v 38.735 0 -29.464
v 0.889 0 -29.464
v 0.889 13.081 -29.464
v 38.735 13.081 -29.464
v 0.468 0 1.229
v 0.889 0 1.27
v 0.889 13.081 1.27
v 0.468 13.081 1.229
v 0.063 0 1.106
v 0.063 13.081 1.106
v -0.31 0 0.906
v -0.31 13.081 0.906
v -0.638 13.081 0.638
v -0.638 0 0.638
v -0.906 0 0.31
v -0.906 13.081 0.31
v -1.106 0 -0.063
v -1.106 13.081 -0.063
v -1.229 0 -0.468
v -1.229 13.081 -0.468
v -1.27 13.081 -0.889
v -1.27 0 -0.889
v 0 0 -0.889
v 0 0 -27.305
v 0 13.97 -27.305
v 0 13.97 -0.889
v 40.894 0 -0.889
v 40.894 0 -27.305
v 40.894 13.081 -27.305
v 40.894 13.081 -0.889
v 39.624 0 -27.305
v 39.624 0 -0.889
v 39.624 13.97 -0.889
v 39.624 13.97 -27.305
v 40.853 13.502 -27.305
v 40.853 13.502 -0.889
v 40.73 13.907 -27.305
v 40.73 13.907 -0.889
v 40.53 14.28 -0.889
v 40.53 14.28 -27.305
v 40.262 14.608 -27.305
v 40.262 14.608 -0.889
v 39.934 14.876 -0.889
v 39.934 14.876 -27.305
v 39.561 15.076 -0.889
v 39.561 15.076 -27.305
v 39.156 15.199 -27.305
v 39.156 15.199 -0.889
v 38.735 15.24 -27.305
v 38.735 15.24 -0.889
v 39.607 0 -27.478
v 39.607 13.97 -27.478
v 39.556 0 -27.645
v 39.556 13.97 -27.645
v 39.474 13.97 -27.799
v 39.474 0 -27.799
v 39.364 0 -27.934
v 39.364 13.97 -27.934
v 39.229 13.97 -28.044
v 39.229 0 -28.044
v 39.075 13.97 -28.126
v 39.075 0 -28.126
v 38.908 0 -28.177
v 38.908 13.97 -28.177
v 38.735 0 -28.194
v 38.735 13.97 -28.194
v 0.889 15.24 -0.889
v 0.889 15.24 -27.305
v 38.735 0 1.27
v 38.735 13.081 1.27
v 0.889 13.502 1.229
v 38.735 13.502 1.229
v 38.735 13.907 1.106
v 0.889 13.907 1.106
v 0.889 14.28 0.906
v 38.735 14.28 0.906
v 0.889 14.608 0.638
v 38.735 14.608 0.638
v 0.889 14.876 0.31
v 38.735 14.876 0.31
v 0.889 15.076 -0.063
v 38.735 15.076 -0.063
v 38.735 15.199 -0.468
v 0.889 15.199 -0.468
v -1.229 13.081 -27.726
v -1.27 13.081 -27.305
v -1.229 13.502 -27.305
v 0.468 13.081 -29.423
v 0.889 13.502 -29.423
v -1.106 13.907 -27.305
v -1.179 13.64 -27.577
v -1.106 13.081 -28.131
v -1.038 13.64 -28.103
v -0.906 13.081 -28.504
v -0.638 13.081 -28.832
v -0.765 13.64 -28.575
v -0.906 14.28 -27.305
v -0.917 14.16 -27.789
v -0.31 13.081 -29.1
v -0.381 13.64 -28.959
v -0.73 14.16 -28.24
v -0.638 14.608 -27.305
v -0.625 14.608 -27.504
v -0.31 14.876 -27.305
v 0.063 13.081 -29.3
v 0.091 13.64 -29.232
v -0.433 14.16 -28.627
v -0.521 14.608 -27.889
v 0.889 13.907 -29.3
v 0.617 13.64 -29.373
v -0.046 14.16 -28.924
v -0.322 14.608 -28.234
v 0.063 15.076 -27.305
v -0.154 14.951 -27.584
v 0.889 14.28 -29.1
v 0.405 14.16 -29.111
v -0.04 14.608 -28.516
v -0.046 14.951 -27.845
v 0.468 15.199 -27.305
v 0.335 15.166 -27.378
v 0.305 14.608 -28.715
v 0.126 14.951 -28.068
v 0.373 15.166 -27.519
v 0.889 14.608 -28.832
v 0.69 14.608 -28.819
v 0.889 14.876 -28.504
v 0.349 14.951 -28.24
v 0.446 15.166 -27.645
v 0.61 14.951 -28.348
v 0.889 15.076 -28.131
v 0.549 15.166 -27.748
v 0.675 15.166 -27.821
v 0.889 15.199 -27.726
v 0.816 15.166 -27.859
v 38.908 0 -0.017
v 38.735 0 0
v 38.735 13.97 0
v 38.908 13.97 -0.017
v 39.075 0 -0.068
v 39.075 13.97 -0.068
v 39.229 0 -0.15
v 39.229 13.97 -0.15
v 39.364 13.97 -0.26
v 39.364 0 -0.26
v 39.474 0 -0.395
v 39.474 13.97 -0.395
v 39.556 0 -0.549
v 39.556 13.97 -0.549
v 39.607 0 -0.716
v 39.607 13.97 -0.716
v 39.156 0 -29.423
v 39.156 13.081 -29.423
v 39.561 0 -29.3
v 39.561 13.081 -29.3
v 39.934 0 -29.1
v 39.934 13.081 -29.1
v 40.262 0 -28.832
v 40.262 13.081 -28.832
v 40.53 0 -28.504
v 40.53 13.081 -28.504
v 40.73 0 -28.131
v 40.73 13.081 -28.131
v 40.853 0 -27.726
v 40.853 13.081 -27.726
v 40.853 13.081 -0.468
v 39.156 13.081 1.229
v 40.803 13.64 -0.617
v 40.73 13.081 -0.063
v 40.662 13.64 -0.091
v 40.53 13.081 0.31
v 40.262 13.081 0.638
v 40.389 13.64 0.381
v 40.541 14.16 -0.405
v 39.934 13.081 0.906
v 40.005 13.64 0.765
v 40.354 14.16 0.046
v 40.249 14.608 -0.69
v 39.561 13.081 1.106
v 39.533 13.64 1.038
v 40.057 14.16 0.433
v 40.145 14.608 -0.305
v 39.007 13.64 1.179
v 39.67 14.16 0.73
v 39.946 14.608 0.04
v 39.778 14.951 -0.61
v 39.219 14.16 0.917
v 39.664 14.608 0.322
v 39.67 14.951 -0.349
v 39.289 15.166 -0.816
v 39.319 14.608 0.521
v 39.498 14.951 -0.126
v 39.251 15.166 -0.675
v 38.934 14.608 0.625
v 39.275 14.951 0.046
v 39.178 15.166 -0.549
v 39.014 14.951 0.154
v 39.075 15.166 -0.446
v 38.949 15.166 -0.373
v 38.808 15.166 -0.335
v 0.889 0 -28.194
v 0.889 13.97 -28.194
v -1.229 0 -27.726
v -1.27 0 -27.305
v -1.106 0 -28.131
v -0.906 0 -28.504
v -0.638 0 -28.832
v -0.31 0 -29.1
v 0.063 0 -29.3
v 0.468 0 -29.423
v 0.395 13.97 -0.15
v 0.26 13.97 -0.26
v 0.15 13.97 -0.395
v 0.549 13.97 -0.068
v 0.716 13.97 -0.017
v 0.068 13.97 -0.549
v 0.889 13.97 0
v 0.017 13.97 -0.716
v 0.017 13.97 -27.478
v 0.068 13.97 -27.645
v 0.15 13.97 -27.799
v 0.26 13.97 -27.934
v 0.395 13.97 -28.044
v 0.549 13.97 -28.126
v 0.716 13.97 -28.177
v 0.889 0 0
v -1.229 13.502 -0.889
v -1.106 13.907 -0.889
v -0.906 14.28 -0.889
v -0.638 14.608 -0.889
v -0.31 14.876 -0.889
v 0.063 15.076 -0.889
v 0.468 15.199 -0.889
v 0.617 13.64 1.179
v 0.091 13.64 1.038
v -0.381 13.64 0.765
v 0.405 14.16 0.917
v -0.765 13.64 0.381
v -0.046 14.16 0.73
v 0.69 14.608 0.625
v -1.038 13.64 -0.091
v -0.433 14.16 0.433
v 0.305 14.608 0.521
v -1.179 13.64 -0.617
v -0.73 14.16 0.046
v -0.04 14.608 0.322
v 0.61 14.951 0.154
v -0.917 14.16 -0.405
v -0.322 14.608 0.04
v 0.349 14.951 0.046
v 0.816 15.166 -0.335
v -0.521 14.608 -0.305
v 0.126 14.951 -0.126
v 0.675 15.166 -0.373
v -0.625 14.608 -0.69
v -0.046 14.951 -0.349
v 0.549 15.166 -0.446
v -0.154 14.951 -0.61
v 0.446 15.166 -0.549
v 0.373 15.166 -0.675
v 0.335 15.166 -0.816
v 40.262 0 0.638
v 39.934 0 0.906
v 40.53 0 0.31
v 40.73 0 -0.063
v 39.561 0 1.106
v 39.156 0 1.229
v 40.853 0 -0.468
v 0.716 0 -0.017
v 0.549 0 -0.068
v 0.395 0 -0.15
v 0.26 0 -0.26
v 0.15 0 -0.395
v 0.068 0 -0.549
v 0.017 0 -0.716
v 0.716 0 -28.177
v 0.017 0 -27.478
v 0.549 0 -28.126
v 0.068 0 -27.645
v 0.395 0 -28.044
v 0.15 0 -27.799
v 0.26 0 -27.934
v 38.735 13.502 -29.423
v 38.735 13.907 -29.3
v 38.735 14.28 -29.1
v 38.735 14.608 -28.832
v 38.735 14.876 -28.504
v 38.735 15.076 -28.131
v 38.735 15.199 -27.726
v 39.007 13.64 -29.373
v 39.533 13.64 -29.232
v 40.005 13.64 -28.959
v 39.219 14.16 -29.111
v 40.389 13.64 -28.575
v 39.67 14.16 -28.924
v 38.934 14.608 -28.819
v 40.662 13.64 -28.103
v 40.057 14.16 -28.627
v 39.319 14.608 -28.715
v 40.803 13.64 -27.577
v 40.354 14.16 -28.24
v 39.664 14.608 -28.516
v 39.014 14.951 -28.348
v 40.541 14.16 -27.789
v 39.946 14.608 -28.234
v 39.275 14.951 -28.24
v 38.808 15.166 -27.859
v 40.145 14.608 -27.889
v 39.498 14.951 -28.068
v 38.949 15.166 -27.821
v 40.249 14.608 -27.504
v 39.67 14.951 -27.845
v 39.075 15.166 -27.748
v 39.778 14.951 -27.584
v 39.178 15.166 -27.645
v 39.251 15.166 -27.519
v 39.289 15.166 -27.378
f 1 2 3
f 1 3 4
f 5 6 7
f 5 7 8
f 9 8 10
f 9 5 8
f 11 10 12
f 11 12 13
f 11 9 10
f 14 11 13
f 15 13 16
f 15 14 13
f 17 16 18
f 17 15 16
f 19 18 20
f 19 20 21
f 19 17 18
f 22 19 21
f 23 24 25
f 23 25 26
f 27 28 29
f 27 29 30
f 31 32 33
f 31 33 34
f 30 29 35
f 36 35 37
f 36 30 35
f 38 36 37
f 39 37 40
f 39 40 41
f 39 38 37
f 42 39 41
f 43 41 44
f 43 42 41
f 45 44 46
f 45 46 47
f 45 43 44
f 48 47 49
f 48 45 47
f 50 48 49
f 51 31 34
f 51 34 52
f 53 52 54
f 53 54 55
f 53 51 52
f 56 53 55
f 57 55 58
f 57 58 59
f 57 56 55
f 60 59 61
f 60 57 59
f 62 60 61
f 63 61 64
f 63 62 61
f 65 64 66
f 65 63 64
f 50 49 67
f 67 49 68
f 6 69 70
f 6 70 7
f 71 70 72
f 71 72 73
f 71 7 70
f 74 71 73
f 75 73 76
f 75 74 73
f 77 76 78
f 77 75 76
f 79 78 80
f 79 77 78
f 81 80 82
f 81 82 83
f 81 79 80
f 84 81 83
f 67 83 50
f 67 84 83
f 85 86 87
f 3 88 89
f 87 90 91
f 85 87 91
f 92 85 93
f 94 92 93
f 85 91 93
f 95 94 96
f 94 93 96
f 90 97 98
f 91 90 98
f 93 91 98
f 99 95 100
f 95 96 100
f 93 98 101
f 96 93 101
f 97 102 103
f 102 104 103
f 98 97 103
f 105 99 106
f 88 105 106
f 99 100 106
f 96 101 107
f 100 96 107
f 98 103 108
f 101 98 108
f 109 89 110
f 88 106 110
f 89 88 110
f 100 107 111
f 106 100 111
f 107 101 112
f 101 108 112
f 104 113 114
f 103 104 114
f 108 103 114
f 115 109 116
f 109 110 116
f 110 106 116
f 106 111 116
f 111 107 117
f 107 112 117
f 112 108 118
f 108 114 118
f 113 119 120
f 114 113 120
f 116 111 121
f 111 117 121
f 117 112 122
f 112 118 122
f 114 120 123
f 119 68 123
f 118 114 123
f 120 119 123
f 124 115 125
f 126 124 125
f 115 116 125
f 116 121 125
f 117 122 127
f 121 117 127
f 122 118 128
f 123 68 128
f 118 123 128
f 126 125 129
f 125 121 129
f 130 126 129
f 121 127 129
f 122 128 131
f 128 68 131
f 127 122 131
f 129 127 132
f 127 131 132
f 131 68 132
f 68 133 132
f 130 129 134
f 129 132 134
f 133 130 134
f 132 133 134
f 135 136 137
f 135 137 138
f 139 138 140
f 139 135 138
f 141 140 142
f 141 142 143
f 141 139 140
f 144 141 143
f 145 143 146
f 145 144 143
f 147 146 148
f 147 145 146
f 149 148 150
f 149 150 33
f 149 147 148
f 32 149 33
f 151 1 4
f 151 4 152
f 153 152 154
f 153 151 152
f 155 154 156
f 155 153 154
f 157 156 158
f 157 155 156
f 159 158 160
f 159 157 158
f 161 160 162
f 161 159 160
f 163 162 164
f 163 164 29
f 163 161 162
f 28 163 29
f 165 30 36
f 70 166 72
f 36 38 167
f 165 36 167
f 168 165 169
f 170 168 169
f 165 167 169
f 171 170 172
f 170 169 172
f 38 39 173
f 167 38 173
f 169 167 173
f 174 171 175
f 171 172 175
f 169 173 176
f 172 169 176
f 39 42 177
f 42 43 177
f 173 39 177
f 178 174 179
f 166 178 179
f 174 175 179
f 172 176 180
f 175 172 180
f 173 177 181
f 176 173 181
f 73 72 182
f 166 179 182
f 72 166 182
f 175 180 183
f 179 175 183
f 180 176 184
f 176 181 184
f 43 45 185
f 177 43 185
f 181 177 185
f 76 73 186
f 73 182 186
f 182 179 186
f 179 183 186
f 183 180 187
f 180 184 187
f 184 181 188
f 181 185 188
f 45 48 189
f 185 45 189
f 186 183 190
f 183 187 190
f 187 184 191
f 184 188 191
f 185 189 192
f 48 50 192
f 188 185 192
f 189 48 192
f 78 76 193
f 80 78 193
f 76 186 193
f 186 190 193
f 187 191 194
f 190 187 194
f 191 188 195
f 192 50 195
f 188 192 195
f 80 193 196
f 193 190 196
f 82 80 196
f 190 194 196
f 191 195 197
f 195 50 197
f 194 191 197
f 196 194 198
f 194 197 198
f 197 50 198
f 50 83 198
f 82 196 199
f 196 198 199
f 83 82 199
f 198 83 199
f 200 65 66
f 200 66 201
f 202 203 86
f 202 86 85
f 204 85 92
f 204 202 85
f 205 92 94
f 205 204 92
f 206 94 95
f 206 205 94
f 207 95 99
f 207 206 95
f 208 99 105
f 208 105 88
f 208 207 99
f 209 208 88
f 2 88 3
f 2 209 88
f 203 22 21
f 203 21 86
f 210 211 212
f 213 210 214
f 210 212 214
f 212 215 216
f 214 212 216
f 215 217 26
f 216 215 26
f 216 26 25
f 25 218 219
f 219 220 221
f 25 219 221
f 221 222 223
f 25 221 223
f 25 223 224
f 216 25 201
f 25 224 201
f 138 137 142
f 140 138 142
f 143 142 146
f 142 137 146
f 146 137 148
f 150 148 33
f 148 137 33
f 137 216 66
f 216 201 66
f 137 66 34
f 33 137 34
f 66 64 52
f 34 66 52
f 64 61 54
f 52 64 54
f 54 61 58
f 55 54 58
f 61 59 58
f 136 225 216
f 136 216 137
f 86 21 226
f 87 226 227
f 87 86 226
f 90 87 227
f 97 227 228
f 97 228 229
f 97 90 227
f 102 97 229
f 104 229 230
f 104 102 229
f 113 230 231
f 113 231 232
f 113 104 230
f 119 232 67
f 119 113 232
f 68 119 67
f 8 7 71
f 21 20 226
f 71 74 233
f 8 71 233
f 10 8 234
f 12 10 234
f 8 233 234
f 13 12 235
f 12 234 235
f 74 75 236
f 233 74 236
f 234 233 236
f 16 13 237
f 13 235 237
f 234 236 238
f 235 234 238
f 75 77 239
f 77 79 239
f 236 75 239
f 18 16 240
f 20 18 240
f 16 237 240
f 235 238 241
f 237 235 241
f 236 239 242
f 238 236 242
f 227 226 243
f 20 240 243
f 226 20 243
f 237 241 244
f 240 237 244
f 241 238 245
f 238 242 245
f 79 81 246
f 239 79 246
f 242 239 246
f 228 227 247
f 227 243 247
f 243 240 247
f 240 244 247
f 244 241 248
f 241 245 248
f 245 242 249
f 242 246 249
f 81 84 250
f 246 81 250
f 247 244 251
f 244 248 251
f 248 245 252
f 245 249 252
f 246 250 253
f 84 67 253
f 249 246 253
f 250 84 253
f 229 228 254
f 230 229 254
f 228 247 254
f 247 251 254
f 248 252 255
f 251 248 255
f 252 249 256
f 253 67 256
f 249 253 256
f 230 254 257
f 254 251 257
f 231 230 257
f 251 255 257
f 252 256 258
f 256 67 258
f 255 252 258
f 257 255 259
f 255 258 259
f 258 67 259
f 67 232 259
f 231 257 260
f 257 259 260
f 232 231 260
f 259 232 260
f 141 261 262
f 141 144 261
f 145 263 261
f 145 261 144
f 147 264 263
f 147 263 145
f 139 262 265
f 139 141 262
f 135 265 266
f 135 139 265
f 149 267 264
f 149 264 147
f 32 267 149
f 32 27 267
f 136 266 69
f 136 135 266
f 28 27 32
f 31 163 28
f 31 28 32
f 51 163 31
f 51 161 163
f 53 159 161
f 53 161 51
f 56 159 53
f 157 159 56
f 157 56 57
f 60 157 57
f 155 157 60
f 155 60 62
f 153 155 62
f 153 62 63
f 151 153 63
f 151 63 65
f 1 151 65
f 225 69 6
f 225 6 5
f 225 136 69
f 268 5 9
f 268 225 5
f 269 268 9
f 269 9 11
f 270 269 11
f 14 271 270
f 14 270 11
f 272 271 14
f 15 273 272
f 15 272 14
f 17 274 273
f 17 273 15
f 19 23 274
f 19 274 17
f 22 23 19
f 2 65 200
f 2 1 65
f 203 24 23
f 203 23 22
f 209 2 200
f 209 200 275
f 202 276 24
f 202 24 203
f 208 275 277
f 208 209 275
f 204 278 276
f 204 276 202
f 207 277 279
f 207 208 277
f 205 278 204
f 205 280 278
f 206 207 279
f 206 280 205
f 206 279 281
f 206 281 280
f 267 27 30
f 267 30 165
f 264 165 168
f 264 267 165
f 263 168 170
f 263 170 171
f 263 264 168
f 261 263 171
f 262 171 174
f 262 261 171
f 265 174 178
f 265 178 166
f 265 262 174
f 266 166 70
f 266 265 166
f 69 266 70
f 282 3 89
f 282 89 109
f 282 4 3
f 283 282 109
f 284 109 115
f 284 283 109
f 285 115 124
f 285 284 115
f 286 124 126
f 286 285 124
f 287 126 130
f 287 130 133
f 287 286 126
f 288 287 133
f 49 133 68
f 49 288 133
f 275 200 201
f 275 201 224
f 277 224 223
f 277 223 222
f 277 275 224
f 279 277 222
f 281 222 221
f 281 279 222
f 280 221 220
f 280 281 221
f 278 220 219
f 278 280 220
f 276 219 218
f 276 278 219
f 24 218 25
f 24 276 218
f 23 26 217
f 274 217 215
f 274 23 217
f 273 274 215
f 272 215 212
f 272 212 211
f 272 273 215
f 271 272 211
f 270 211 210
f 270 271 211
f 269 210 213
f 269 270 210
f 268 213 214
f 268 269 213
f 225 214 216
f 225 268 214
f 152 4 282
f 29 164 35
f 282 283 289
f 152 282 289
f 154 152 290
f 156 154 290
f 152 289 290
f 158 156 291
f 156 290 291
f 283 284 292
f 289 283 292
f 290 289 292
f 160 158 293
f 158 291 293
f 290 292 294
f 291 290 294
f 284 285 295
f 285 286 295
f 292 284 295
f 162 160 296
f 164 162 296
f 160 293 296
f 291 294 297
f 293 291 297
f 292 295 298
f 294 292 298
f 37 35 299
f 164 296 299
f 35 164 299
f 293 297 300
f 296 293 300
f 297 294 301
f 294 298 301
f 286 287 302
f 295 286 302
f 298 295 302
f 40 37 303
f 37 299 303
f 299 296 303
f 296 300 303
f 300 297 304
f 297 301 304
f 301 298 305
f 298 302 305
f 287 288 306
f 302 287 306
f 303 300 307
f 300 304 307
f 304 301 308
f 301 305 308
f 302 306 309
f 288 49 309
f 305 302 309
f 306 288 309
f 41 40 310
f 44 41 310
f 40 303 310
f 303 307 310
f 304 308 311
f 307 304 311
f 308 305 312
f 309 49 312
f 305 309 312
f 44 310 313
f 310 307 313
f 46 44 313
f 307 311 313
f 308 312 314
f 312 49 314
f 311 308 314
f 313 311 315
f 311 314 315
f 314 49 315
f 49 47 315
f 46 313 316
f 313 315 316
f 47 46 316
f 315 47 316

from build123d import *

# Parameters (mm, degrees)
BOSS_EXTRUDE1_DEPTH = 15.24
BOSS_EXTRUDE2_START = -1.27
BOSS_EXTRUDE2_DEPTH = 1.27
FILLET1_R           = 2.159


with BuildPart() as part:
    # Sketch1 → Boss-Extrude1 (new body)
    with BuildSketch(Plane(origin=(0, 0, 0), x_dir=(1, 0, 0), z_dir=(0, 1, 0))):
        with BuildLine():
            ThreePointArc((0.889, 29.464), (-0.637643541, 28.831643541), (-1.27, 27.305))
            Line((-1.27, 27.305), (-1.27, 0.889))
            ThreePointArc((-1.27, 0.889), (-0.637643541, -0.637643541), (0.889, -1.27))
            Line((0.889, -1.27), (38.735, -1.27))
            ThreePointArc((38.735, -1.27), (40.261643541, -0.637643541), (40.894, 0.889))
            Line((40.894, 0.889), (40.894, 27.305))
            ThreePointArc((40.894, 27.305), (40.261643541, 28.831643541), (38.735, 29.464))
            Line((38.735, 29.464), (0.889, 29.464))
        make_face()
        with BuildLine():
            Line((38.735, 0), (0.889, 0))
            ThreePointArc((0.889, 0), (0.260382072, 0.260382072), (0, 0.889))
            Line((0, 0.889), (0, 27.305))
            ThreePointArc((0, 27.305), (0.260382072, 27.933617928), (0.889, 28.194))
            Line((0.889, 28.194), (38.735, 28.194))
            ThreePointArc((38.735, 28.194), (39.363617928, 27.933617928), (39.624, 27.305))
            Line((39.624, 27.305), (39.624, 0.889))
            ThreePointArc((39.624, 0.889), (39.363617928, 0.260382072), (38.735, 0))
        make_face(mode=Mode.SUBTRACT)
    extrude(amount=BOSS_EXTRUDE1_DEPTH)

    # Sketch2 → Boss-Extrude2 (add)
    with BuildSketch(Plane(origin=(0, 15.24, 0), x_dir=(1, 0, 0), z_dir=(0, 1, 0)).offset(BOSS_EXTRUDE2_START)):
        with BuildLine():
            Line((38.735, 28.194), (0.889, 28.194))
            ThreePointArc((0.889, 28.194), (0.260382072, 27.933617928), (0, 27.305))
            Line((0, 27.305), (0, 0.889))
            ThreePointArc((0, 0.889), (0.260382072, 0.260382072), (0.889, 0))
            Line((0.889, 0), (38.735, 0))
            ThreePointArc((38.735, 0), (39.363617928, 0.260382072), (39.624, 0.889))
            Line((39.624, 0.889), (39.624, 27.305))
            ThreePointArc((39.624, 27.305), (39.363617928, 27.933617928), (38.735, 28.194))
        make_face()
    extrude(amount=BOSS_EXTRUDE2_DEPTH)

    # Fillet1
    fillet1_edges = [part.edges().sort_by_distance(p)[0] for p in [
        (19.812, 15.24, -29.464),
        (40.261643541, 15.24, -28.831643541),
        (40.894, 15.24, -14.097),
        (40.261643541, 15.24, 0.637643541),
        (19.812, 15.24, 1.27),
        (-0.637643541, 15.24, 0.637643541),
        (-1.27, 15.24, -14.097),
        (-0.637643541, 15.24, -28.831643541),
    ]]
    fillet(fillet1_edges, radius=FILLET1_R)


solid = part.part
